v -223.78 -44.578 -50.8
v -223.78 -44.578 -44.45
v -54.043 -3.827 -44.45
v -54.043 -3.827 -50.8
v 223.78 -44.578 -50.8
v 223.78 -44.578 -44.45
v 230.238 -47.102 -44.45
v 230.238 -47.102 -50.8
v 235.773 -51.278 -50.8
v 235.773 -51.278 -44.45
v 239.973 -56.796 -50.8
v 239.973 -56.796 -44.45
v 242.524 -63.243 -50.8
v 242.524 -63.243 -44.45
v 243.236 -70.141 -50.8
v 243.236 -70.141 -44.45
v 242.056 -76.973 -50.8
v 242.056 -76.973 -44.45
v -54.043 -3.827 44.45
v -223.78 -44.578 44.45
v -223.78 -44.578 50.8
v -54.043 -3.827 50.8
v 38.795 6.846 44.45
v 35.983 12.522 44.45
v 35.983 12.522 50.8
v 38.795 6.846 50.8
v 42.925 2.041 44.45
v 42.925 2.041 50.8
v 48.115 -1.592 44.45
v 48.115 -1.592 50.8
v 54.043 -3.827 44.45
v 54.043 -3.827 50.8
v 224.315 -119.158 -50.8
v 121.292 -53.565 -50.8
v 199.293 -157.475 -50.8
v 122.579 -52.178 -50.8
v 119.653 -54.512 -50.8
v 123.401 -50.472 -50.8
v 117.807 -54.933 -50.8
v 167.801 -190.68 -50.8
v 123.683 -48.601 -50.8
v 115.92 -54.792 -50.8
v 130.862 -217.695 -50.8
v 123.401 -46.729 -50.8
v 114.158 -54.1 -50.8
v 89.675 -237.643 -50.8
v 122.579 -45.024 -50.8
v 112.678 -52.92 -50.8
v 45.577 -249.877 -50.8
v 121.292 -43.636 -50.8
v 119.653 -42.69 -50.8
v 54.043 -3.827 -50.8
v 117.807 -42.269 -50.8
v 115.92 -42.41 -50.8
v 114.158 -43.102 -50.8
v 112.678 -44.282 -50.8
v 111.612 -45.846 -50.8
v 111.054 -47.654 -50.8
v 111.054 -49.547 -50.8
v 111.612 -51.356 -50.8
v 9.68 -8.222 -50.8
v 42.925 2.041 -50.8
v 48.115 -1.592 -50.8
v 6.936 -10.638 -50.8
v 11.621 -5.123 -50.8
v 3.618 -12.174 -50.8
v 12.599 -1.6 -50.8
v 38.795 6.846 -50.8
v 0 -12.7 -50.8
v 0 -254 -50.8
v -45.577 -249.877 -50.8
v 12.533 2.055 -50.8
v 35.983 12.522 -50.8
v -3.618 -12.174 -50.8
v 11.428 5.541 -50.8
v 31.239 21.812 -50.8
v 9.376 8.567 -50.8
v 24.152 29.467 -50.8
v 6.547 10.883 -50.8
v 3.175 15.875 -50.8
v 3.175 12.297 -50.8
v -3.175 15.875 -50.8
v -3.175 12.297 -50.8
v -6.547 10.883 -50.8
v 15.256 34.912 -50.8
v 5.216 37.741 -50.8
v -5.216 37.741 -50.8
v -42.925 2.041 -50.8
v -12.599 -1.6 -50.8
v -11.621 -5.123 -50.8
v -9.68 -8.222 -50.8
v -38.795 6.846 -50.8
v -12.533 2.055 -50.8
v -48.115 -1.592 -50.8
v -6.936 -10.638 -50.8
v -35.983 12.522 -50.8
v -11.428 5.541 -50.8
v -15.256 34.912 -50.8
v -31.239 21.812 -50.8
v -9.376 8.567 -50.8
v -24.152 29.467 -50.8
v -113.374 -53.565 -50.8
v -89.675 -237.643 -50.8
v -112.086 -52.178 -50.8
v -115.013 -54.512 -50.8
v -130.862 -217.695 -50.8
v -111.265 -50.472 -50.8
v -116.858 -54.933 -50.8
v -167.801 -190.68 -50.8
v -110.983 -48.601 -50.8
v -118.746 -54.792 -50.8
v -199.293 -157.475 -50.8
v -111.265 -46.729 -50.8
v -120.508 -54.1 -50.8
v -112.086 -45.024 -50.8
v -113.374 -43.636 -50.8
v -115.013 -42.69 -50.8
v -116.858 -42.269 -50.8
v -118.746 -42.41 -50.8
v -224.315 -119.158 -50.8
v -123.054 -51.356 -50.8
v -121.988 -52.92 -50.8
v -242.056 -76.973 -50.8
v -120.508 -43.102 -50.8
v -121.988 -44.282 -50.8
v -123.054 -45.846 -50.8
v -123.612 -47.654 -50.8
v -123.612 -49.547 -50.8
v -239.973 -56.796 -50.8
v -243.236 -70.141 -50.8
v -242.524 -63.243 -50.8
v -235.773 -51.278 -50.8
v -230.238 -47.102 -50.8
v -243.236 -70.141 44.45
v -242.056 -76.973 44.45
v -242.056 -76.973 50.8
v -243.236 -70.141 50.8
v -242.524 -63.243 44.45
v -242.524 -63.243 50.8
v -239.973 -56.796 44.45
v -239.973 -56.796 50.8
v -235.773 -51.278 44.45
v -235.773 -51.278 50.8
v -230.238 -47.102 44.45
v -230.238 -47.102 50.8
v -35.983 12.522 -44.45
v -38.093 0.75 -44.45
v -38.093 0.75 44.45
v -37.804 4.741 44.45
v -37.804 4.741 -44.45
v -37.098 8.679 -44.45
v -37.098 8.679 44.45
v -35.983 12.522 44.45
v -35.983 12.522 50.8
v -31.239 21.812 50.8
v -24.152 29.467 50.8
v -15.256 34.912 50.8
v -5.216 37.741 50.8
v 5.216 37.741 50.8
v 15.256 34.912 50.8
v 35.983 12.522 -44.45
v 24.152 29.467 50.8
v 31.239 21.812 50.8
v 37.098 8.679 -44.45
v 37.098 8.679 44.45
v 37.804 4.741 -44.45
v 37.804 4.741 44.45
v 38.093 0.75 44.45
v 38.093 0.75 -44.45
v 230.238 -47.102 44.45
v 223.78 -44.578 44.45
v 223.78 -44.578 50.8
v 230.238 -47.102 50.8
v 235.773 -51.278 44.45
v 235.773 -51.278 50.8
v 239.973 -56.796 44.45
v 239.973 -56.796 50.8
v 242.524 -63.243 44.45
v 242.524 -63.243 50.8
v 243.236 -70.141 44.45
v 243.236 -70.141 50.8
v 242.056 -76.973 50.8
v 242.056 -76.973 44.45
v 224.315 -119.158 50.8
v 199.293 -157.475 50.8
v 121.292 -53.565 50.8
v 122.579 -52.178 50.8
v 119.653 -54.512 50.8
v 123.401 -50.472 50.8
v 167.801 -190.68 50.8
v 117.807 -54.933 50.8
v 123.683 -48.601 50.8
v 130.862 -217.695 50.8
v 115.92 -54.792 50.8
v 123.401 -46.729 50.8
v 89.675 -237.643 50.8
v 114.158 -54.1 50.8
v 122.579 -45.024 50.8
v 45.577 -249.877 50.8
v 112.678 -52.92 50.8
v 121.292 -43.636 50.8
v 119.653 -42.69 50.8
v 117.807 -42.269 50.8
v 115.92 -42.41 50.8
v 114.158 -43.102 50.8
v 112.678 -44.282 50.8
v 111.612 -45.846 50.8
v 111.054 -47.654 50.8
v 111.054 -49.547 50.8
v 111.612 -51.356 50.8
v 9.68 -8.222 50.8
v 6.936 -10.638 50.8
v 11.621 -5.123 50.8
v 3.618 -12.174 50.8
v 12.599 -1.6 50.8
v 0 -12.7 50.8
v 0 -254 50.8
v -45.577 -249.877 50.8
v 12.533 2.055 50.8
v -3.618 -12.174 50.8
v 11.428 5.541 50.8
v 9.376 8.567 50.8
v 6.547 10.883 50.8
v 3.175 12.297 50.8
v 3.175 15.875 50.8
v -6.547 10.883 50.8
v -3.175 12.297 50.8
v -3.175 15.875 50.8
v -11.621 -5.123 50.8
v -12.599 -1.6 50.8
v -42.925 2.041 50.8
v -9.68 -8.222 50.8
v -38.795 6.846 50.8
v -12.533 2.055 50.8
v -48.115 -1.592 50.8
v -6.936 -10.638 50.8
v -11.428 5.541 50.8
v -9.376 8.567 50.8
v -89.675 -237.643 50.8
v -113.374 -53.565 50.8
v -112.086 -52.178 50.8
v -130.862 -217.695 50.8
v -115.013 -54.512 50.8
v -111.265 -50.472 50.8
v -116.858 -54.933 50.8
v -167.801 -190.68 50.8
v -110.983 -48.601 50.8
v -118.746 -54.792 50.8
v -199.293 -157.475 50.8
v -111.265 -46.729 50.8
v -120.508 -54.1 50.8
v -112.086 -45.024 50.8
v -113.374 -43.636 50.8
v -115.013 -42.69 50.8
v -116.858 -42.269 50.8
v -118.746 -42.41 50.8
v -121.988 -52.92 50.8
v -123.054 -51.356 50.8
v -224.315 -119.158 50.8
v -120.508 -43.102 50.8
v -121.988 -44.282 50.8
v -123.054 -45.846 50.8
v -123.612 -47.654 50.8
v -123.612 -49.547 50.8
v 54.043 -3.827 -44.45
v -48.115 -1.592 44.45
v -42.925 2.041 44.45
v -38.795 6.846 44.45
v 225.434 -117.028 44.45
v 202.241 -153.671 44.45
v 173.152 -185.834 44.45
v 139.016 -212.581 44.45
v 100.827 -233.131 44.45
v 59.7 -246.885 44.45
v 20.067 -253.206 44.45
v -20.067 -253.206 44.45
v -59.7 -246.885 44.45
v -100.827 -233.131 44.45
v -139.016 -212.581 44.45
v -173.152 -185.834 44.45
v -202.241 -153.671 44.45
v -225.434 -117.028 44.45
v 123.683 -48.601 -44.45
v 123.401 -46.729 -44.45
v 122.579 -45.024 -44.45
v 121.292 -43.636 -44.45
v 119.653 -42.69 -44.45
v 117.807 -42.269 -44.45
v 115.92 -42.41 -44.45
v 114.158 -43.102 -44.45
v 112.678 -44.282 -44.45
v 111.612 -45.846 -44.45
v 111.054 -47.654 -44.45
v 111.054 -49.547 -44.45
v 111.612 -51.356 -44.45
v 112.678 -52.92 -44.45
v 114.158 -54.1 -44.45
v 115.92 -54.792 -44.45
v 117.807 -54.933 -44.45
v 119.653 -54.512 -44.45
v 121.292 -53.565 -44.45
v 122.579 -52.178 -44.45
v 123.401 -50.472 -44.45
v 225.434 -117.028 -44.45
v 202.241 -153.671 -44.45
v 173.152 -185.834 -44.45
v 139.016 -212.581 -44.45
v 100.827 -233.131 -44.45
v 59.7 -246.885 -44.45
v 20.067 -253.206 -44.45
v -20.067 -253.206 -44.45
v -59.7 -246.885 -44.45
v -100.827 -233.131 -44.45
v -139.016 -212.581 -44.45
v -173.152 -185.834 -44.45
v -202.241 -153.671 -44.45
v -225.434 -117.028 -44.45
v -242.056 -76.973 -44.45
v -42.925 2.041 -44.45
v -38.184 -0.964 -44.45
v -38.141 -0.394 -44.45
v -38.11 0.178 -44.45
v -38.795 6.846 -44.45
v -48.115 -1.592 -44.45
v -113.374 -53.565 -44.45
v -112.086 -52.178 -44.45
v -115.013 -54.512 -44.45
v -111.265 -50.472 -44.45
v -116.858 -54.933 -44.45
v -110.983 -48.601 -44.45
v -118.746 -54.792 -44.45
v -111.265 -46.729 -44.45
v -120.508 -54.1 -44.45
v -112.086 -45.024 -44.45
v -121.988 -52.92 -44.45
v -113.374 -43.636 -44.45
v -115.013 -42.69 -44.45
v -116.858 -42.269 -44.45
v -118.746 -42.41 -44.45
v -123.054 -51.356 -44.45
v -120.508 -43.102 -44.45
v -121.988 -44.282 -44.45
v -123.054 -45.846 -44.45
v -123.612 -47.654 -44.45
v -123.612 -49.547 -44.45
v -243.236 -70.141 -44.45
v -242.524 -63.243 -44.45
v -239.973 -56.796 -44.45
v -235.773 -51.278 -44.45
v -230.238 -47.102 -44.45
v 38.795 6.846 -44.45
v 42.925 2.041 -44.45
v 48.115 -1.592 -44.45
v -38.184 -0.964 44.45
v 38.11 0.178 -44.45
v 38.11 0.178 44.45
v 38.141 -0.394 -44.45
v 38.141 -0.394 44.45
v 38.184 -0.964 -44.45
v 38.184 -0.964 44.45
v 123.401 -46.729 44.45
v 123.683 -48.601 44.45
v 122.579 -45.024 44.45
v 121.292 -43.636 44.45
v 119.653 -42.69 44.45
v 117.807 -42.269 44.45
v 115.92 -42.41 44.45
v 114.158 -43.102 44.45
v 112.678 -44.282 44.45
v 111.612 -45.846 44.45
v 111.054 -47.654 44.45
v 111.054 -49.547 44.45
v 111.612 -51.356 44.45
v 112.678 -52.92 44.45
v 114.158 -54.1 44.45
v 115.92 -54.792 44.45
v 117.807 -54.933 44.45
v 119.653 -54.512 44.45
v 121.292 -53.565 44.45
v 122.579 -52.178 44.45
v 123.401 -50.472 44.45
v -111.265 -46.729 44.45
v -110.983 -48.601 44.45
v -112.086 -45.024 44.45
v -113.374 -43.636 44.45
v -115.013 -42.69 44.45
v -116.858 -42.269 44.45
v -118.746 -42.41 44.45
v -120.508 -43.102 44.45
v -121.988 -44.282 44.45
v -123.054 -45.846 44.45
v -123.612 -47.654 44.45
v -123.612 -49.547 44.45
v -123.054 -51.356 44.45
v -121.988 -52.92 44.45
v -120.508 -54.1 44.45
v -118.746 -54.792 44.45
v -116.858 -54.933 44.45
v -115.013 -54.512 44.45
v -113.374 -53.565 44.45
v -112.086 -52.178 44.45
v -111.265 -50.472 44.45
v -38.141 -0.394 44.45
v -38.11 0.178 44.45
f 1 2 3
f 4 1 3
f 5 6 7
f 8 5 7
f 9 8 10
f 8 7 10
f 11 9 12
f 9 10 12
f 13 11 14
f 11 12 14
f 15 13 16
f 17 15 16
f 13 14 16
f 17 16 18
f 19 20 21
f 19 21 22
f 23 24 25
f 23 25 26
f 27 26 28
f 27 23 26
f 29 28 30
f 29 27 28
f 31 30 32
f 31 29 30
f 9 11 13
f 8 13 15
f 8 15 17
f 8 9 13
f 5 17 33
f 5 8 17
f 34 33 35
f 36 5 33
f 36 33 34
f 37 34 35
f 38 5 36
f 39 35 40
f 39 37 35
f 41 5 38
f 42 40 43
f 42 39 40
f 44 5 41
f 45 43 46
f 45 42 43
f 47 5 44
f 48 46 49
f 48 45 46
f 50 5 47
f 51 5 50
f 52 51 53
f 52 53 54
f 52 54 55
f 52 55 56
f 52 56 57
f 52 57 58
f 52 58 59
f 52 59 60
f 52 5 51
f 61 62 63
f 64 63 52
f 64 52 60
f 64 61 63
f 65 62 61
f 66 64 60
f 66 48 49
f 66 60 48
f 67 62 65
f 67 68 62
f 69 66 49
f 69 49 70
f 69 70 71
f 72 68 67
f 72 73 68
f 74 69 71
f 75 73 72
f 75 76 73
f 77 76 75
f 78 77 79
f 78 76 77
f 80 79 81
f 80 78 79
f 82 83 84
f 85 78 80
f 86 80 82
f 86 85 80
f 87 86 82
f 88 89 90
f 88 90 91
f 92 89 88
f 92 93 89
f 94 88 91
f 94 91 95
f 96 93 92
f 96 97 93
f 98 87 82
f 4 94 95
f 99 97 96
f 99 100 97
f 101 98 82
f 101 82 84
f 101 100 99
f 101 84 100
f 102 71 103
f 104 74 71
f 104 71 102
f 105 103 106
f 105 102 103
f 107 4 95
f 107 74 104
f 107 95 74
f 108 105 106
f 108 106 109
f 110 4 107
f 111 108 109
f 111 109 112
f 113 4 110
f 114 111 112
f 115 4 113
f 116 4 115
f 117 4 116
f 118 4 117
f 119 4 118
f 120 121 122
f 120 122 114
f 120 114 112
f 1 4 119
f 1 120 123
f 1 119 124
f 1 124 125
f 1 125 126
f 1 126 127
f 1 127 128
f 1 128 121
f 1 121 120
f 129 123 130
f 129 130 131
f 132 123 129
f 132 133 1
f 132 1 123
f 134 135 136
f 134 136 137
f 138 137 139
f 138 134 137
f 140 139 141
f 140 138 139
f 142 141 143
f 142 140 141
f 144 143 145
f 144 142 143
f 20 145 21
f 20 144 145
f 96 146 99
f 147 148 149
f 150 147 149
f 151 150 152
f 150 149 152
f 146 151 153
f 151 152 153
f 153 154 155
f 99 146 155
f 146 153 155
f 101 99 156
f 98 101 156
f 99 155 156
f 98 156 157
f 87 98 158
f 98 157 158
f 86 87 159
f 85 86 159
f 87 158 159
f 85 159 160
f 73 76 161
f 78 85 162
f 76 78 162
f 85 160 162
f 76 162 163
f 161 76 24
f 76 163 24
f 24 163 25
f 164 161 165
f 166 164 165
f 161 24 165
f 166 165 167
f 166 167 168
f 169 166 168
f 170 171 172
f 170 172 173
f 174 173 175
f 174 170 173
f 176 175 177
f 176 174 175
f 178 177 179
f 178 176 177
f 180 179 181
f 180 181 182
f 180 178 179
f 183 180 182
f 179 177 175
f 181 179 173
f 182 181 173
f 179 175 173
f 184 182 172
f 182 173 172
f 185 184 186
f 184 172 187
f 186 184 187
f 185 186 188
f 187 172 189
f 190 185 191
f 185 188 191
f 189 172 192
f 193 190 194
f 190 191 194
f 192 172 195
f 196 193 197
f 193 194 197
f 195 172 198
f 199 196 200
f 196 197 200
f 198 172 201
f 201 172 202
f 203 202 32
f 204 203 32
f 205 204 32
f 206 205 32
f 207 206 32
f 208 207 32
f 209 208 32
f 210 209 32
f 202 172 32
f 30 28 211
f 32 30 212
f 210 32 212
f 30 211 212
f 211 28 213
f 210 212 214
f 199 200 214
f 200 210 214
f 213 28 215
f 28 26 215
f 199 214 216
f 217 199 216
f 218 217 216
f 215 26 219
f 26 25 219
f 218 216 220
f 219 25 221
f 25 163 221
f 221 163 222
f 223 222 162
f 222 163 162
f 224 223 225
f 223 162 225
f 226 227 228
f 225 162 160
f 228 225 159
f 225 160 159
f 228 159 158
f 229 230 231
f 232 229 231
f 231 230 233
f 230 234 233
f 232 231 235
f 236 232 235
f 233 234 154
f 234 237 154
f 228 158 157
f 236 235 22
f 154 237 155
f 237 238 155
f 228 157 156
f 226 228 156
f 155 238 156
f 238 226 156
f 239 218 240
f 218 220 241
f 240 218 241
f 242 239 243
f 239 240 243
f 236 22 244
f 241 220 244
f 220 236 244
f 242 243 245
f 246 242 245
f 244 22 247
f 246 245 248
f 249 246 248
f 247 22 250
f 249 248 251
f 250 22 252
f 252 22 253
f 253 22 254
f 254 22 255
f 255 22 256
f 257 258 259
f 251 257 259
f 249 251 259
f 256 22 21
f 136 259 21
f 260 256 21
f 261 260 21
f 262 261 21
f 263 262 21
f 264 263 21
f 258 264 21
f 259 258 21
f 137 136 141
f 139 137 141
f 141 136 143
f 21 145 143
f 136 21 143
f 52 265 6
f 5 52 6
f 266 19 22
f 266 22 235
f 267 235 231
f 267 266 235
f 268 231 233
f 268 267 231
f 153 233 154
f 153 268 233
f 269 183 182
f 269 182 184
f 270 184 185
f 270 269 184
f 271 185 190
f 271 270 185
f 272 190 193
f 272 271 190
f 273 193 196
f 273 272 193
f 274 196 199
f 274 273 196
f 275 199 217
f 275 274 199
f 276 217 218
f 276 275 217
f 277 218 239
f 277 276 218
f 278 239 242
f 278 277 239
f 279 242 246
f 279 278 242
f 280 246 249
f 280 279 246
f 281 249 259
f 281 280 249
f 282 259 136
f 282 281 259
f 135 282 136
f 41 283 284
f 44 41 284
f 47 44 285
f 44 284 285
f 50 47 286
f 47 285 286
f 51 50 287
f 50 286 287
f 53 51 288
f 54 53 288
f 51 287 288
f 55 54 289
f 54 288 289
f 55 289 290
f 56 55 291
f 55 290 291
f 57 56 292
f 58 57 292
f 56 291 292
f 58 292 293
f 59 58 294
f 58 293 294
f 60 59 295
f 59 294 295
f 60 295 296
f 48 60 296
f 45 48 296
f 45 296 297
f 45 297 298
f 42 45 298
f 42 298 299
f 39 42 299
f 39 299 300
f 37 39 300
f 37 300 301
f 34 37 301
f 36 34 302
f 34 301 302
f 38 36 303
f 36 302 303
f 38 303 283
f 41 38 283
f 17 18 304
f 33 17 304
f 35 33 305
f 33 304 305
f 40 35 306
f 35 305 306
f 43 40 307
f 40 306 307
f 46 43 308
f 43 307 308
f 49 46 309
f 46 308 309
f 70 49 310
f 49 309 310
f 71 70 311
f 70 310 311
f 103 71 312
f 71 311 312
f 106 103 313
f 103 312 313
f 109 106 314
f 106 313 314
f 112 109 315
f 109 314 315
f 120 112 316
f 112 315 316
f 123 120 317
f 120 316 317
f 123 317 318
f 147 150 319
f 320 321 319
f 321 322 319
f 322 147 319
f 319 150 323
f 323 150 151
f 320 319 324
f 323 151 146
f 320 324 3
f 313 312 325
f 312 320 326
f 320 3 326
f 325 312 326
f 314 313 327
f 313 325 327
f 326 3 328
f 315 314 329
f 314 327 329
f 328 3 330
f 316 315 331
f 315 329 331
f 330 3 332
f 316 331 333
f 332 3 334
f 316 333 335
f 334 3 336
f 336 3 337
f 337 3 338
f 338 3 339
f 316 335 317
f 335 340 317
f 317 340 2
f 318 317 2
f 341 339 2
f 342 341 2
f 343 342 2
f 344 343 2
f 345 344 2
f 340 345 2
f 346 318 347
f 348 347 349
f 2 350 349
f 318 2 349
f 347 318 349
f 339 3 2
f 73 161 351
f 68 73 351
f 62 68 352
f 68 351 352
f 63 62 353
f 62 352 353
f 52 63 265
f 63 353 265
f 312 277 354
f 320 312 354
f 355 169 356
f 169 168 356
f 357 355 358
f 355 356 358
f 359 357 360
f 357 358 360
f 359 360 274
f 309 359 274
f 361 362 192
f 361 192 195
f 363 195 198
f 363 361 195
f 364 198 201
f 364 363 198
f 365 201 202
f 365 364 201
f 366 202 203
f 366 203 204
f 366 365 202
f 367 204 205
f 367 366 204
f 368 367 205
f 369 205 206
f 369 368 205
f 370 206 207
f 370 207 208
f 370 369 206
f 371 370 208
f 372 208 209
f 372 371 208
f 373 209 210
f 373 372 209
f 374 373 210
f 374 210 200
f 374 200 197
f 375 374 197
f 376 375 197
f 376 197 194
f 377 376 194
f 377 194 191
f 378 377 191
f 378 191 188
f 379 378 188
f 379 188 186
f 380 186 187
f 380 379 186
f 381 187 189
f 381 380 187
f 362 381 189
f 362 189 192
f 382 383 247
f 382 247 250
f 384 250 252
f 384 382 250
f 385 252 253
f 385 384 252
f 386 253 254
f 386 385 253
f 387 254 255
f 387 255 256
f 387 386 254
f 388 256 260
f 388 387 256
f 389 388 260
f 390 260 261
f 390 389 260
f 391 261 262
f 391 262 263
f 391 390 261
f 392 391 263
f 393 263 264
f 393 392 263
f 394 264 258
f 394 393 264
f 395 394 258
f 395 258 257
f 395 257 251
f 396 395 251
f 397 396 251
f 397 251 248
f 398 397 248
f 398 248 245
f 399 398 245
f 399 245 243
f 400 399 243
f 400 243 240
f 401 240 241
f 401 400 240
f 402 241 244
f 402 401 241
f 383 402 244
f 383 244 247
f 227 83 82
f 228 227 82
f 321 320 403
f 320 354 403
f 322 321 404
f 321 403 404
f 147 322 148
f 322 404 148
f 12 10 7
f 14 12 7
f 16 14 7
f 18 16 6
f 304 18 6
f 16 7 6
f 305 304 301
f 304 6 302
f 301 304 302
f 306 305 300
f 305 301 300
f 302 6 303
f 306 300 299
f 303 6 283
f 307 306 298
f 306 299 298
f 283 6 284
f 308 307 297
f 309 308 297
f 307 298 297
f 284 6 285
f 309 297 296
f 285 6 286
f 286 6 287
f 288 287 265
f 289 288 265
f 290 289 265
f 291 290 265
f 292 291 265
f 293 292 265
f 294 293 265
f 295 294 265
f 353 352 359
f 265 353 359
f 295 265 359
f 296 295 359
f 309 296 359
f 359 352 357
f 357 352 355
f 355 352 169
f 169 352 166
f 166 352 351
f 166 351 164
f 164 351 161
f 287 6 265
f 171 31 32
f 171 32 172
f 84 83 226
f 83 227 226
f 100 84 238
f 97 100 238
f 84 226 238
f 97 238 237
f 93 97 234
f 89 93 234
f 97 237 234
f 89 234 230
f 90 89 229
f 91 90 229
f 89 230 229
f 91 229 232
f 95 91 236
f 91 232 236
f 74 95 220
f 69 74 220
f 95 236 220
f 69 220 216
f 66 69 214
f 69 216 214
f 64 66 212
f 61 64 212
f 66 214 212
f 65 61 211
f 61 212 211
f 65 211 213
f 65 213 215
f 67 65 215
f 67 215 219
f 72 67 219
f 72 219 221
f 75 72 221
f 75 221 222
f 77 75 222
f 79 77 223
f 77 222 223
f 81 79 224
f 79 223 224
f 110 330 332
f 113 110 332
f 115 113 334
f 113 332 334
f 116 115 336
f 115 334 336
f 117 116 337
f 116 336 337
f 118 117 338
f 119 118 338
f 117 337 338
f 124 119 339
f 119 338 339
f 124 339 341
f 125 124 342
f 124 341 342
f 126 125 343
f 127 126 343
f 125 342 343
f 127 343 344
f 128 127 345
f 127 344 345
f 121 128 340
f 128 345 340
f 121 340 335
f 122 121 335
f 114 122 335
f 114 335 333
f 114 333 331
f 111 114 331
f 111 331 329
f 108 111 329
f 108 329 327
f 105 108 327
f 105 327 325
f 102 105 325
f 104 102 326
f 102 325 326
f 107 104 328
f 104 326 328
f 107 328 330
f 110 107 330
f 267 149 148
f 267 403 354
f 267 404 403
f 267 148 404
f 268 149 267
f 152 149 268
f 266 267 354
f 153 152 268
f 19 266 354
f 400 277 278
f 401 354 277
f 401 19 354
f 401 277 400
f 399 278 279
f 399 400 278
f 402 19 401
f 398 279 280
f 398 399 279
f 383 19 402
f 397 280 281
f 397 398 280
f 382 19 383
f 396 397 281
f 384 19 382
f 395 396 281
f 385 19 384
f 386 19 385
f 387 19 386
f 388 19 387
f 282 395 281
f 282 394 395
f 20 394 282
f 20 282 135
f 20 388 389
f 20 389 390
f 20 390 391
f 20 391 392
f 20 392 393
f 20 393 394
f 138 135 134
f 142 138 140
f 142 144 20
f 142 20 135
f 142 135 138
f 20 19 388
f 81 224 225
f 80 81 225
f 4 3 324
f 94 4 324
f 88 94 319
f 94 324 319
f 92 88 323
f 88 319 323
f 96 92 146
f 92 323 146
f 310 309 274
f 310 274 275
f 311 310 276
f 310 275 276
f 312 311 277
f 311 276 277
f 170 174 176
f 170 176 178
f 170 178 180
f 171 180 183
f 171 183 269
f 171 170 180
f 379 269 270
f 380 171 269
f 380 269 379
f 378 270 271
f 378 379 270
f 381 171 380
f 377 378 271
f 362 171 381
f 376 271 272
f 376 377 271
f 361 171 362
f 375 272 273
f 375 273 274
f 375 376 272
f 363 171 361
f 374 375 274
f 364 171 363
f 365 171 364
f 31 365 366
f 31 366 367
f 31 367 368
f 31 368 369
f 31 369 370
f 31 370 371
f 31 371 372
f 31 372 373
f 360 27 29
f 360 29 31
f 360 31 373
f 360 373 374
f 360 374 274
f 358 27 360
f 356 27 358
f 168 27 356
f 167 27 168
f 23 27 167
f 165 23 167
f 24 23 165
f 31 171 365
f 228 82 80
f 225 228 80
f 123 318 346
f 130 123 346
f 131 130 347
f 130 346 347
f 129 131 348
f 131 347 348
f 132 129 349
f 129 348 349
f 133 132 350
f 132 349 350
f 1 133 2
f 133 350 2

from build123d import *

# Parameters (mm, degrees)
SKETCH1_R               = 12.7
BOSS_EXTRUDE1_DEPTH     = 44.45
SKETCH5_R               = 12.7
SKETCH5_R_2             = 6.35
BOSS_EXTRUDE2_DEPTH     = 6.35
SKETCH8_W               = 6.35
SKETCH8_H               = 6.35
CUT_EXTRUDE1_DEPTH      = 51.8
CUT_EXTRUDE1_DEPTH_BACK = 51.8


with BuildPart() as part:
    # Sketch1 → Boss-Extrude1 (new body, symmetric)
    with BuildSketch(Plane.XY):
        with BuildLine():
            Line((-59.699595301, -246.884504011), (-38.184359795, -0.964236874))
            ThreePointArc((-38.184359795, -0.964236874), (-38.124009824, -0.108037848), (-38.092623076, 0.749711395))
            ThreePointArc((-38.092623076, 0.749711395), (0, 38.1), (38.092623076, 0.749711395))
            ThreePointArc((38.092623076, 0.749711395), (38.124009824, -0.108037848), (38.184359795, -0.964236874))
            Line((38.184359795, -0.964236874), (59.699595301, -246.884504011))
            ThreePointArc((59.699595301, -246.884504011), (0, -254), (-59.699595301, -246.884504011))
        make_face()
        Circle(SKETCH1_R, mode=Mode.SUBTRACT)
    extrude(amount=BOSS_EXTRUDE1_DEPTH, both=True)

    # Sketch5 → Boss-Extrude2 (add)
    with BuildSketch(Plane.XY.offset(44.45)):
        with BuildLine():
            Line((-223.779910529, -44.577802506), (-54.04268144, -3.827499177))
            ThreePointArc((-54.04268144, -3.827499177), (-42.924981025, 2.041131203), (-35.983316209, 12.522418081))
            ThreePointArc((-35.983316209, 12.522418081), (0, 38.1), (35.983316209, 12.522418081))
            ThreePointArc((35.983316209, 12.522418081), (42.924981025, 2.041131203), (54.04268144, -3.827499177))
            Line((54.04268144, -3.827499177), (223.779910529, -44.577802506))
            ThreePointArc((223.779910529, -44.577802506), (239.972758508, -56.795566669), (242.055998097, -76.973331649))
            ThreePointArc((242.055998097, -76.973331649), (0, -254), (-242.055998097, -76.973331649))
            ThreePointArc((-242.055998097, -76.973331649), (-239.972758508, -56.795566669), (-223.779910529, -44.577802506))
        make_face()
        Circle(SKETCH5_R, mode=Mode.SUBTRACT)
        with Locations((-117.332700629, -48.60079591)):
            Circle(SKETCH5_R_2, mode=Mode.SUBTRACT)
        with Locations((117.332700629, -48.60079591)):
            Circle(SKETCH5_R_2, mode=Mode.SUBTRACT)
    boss_extrude2 = extrude(amount=BOSS_EXTRUDE2_DEPTH)

    # Mirror1: Boss-Extrude2 across plane
    add(boss_extrude2.mirror(Plane.XY))

    # Sketch8 → Cut-Extrude1 (cut, two sides)
    with BuildSketch(Plane.XY) as cut_extrude1_sk:
        with Locations((0, 12.7)):
            Rectangle(SKETCH8_W, SKETCH8_H)
    extrude(amount=CUT_EXTRUDE1_DEPTH, mode=Mode.SUBTRACT)
    extrude(cut_extrude1_sk.sketch, amount=-CUT_EXTRUDE1_DEPTH_BACK, mode=Mode.SUBTRACT)


solid = part.part
